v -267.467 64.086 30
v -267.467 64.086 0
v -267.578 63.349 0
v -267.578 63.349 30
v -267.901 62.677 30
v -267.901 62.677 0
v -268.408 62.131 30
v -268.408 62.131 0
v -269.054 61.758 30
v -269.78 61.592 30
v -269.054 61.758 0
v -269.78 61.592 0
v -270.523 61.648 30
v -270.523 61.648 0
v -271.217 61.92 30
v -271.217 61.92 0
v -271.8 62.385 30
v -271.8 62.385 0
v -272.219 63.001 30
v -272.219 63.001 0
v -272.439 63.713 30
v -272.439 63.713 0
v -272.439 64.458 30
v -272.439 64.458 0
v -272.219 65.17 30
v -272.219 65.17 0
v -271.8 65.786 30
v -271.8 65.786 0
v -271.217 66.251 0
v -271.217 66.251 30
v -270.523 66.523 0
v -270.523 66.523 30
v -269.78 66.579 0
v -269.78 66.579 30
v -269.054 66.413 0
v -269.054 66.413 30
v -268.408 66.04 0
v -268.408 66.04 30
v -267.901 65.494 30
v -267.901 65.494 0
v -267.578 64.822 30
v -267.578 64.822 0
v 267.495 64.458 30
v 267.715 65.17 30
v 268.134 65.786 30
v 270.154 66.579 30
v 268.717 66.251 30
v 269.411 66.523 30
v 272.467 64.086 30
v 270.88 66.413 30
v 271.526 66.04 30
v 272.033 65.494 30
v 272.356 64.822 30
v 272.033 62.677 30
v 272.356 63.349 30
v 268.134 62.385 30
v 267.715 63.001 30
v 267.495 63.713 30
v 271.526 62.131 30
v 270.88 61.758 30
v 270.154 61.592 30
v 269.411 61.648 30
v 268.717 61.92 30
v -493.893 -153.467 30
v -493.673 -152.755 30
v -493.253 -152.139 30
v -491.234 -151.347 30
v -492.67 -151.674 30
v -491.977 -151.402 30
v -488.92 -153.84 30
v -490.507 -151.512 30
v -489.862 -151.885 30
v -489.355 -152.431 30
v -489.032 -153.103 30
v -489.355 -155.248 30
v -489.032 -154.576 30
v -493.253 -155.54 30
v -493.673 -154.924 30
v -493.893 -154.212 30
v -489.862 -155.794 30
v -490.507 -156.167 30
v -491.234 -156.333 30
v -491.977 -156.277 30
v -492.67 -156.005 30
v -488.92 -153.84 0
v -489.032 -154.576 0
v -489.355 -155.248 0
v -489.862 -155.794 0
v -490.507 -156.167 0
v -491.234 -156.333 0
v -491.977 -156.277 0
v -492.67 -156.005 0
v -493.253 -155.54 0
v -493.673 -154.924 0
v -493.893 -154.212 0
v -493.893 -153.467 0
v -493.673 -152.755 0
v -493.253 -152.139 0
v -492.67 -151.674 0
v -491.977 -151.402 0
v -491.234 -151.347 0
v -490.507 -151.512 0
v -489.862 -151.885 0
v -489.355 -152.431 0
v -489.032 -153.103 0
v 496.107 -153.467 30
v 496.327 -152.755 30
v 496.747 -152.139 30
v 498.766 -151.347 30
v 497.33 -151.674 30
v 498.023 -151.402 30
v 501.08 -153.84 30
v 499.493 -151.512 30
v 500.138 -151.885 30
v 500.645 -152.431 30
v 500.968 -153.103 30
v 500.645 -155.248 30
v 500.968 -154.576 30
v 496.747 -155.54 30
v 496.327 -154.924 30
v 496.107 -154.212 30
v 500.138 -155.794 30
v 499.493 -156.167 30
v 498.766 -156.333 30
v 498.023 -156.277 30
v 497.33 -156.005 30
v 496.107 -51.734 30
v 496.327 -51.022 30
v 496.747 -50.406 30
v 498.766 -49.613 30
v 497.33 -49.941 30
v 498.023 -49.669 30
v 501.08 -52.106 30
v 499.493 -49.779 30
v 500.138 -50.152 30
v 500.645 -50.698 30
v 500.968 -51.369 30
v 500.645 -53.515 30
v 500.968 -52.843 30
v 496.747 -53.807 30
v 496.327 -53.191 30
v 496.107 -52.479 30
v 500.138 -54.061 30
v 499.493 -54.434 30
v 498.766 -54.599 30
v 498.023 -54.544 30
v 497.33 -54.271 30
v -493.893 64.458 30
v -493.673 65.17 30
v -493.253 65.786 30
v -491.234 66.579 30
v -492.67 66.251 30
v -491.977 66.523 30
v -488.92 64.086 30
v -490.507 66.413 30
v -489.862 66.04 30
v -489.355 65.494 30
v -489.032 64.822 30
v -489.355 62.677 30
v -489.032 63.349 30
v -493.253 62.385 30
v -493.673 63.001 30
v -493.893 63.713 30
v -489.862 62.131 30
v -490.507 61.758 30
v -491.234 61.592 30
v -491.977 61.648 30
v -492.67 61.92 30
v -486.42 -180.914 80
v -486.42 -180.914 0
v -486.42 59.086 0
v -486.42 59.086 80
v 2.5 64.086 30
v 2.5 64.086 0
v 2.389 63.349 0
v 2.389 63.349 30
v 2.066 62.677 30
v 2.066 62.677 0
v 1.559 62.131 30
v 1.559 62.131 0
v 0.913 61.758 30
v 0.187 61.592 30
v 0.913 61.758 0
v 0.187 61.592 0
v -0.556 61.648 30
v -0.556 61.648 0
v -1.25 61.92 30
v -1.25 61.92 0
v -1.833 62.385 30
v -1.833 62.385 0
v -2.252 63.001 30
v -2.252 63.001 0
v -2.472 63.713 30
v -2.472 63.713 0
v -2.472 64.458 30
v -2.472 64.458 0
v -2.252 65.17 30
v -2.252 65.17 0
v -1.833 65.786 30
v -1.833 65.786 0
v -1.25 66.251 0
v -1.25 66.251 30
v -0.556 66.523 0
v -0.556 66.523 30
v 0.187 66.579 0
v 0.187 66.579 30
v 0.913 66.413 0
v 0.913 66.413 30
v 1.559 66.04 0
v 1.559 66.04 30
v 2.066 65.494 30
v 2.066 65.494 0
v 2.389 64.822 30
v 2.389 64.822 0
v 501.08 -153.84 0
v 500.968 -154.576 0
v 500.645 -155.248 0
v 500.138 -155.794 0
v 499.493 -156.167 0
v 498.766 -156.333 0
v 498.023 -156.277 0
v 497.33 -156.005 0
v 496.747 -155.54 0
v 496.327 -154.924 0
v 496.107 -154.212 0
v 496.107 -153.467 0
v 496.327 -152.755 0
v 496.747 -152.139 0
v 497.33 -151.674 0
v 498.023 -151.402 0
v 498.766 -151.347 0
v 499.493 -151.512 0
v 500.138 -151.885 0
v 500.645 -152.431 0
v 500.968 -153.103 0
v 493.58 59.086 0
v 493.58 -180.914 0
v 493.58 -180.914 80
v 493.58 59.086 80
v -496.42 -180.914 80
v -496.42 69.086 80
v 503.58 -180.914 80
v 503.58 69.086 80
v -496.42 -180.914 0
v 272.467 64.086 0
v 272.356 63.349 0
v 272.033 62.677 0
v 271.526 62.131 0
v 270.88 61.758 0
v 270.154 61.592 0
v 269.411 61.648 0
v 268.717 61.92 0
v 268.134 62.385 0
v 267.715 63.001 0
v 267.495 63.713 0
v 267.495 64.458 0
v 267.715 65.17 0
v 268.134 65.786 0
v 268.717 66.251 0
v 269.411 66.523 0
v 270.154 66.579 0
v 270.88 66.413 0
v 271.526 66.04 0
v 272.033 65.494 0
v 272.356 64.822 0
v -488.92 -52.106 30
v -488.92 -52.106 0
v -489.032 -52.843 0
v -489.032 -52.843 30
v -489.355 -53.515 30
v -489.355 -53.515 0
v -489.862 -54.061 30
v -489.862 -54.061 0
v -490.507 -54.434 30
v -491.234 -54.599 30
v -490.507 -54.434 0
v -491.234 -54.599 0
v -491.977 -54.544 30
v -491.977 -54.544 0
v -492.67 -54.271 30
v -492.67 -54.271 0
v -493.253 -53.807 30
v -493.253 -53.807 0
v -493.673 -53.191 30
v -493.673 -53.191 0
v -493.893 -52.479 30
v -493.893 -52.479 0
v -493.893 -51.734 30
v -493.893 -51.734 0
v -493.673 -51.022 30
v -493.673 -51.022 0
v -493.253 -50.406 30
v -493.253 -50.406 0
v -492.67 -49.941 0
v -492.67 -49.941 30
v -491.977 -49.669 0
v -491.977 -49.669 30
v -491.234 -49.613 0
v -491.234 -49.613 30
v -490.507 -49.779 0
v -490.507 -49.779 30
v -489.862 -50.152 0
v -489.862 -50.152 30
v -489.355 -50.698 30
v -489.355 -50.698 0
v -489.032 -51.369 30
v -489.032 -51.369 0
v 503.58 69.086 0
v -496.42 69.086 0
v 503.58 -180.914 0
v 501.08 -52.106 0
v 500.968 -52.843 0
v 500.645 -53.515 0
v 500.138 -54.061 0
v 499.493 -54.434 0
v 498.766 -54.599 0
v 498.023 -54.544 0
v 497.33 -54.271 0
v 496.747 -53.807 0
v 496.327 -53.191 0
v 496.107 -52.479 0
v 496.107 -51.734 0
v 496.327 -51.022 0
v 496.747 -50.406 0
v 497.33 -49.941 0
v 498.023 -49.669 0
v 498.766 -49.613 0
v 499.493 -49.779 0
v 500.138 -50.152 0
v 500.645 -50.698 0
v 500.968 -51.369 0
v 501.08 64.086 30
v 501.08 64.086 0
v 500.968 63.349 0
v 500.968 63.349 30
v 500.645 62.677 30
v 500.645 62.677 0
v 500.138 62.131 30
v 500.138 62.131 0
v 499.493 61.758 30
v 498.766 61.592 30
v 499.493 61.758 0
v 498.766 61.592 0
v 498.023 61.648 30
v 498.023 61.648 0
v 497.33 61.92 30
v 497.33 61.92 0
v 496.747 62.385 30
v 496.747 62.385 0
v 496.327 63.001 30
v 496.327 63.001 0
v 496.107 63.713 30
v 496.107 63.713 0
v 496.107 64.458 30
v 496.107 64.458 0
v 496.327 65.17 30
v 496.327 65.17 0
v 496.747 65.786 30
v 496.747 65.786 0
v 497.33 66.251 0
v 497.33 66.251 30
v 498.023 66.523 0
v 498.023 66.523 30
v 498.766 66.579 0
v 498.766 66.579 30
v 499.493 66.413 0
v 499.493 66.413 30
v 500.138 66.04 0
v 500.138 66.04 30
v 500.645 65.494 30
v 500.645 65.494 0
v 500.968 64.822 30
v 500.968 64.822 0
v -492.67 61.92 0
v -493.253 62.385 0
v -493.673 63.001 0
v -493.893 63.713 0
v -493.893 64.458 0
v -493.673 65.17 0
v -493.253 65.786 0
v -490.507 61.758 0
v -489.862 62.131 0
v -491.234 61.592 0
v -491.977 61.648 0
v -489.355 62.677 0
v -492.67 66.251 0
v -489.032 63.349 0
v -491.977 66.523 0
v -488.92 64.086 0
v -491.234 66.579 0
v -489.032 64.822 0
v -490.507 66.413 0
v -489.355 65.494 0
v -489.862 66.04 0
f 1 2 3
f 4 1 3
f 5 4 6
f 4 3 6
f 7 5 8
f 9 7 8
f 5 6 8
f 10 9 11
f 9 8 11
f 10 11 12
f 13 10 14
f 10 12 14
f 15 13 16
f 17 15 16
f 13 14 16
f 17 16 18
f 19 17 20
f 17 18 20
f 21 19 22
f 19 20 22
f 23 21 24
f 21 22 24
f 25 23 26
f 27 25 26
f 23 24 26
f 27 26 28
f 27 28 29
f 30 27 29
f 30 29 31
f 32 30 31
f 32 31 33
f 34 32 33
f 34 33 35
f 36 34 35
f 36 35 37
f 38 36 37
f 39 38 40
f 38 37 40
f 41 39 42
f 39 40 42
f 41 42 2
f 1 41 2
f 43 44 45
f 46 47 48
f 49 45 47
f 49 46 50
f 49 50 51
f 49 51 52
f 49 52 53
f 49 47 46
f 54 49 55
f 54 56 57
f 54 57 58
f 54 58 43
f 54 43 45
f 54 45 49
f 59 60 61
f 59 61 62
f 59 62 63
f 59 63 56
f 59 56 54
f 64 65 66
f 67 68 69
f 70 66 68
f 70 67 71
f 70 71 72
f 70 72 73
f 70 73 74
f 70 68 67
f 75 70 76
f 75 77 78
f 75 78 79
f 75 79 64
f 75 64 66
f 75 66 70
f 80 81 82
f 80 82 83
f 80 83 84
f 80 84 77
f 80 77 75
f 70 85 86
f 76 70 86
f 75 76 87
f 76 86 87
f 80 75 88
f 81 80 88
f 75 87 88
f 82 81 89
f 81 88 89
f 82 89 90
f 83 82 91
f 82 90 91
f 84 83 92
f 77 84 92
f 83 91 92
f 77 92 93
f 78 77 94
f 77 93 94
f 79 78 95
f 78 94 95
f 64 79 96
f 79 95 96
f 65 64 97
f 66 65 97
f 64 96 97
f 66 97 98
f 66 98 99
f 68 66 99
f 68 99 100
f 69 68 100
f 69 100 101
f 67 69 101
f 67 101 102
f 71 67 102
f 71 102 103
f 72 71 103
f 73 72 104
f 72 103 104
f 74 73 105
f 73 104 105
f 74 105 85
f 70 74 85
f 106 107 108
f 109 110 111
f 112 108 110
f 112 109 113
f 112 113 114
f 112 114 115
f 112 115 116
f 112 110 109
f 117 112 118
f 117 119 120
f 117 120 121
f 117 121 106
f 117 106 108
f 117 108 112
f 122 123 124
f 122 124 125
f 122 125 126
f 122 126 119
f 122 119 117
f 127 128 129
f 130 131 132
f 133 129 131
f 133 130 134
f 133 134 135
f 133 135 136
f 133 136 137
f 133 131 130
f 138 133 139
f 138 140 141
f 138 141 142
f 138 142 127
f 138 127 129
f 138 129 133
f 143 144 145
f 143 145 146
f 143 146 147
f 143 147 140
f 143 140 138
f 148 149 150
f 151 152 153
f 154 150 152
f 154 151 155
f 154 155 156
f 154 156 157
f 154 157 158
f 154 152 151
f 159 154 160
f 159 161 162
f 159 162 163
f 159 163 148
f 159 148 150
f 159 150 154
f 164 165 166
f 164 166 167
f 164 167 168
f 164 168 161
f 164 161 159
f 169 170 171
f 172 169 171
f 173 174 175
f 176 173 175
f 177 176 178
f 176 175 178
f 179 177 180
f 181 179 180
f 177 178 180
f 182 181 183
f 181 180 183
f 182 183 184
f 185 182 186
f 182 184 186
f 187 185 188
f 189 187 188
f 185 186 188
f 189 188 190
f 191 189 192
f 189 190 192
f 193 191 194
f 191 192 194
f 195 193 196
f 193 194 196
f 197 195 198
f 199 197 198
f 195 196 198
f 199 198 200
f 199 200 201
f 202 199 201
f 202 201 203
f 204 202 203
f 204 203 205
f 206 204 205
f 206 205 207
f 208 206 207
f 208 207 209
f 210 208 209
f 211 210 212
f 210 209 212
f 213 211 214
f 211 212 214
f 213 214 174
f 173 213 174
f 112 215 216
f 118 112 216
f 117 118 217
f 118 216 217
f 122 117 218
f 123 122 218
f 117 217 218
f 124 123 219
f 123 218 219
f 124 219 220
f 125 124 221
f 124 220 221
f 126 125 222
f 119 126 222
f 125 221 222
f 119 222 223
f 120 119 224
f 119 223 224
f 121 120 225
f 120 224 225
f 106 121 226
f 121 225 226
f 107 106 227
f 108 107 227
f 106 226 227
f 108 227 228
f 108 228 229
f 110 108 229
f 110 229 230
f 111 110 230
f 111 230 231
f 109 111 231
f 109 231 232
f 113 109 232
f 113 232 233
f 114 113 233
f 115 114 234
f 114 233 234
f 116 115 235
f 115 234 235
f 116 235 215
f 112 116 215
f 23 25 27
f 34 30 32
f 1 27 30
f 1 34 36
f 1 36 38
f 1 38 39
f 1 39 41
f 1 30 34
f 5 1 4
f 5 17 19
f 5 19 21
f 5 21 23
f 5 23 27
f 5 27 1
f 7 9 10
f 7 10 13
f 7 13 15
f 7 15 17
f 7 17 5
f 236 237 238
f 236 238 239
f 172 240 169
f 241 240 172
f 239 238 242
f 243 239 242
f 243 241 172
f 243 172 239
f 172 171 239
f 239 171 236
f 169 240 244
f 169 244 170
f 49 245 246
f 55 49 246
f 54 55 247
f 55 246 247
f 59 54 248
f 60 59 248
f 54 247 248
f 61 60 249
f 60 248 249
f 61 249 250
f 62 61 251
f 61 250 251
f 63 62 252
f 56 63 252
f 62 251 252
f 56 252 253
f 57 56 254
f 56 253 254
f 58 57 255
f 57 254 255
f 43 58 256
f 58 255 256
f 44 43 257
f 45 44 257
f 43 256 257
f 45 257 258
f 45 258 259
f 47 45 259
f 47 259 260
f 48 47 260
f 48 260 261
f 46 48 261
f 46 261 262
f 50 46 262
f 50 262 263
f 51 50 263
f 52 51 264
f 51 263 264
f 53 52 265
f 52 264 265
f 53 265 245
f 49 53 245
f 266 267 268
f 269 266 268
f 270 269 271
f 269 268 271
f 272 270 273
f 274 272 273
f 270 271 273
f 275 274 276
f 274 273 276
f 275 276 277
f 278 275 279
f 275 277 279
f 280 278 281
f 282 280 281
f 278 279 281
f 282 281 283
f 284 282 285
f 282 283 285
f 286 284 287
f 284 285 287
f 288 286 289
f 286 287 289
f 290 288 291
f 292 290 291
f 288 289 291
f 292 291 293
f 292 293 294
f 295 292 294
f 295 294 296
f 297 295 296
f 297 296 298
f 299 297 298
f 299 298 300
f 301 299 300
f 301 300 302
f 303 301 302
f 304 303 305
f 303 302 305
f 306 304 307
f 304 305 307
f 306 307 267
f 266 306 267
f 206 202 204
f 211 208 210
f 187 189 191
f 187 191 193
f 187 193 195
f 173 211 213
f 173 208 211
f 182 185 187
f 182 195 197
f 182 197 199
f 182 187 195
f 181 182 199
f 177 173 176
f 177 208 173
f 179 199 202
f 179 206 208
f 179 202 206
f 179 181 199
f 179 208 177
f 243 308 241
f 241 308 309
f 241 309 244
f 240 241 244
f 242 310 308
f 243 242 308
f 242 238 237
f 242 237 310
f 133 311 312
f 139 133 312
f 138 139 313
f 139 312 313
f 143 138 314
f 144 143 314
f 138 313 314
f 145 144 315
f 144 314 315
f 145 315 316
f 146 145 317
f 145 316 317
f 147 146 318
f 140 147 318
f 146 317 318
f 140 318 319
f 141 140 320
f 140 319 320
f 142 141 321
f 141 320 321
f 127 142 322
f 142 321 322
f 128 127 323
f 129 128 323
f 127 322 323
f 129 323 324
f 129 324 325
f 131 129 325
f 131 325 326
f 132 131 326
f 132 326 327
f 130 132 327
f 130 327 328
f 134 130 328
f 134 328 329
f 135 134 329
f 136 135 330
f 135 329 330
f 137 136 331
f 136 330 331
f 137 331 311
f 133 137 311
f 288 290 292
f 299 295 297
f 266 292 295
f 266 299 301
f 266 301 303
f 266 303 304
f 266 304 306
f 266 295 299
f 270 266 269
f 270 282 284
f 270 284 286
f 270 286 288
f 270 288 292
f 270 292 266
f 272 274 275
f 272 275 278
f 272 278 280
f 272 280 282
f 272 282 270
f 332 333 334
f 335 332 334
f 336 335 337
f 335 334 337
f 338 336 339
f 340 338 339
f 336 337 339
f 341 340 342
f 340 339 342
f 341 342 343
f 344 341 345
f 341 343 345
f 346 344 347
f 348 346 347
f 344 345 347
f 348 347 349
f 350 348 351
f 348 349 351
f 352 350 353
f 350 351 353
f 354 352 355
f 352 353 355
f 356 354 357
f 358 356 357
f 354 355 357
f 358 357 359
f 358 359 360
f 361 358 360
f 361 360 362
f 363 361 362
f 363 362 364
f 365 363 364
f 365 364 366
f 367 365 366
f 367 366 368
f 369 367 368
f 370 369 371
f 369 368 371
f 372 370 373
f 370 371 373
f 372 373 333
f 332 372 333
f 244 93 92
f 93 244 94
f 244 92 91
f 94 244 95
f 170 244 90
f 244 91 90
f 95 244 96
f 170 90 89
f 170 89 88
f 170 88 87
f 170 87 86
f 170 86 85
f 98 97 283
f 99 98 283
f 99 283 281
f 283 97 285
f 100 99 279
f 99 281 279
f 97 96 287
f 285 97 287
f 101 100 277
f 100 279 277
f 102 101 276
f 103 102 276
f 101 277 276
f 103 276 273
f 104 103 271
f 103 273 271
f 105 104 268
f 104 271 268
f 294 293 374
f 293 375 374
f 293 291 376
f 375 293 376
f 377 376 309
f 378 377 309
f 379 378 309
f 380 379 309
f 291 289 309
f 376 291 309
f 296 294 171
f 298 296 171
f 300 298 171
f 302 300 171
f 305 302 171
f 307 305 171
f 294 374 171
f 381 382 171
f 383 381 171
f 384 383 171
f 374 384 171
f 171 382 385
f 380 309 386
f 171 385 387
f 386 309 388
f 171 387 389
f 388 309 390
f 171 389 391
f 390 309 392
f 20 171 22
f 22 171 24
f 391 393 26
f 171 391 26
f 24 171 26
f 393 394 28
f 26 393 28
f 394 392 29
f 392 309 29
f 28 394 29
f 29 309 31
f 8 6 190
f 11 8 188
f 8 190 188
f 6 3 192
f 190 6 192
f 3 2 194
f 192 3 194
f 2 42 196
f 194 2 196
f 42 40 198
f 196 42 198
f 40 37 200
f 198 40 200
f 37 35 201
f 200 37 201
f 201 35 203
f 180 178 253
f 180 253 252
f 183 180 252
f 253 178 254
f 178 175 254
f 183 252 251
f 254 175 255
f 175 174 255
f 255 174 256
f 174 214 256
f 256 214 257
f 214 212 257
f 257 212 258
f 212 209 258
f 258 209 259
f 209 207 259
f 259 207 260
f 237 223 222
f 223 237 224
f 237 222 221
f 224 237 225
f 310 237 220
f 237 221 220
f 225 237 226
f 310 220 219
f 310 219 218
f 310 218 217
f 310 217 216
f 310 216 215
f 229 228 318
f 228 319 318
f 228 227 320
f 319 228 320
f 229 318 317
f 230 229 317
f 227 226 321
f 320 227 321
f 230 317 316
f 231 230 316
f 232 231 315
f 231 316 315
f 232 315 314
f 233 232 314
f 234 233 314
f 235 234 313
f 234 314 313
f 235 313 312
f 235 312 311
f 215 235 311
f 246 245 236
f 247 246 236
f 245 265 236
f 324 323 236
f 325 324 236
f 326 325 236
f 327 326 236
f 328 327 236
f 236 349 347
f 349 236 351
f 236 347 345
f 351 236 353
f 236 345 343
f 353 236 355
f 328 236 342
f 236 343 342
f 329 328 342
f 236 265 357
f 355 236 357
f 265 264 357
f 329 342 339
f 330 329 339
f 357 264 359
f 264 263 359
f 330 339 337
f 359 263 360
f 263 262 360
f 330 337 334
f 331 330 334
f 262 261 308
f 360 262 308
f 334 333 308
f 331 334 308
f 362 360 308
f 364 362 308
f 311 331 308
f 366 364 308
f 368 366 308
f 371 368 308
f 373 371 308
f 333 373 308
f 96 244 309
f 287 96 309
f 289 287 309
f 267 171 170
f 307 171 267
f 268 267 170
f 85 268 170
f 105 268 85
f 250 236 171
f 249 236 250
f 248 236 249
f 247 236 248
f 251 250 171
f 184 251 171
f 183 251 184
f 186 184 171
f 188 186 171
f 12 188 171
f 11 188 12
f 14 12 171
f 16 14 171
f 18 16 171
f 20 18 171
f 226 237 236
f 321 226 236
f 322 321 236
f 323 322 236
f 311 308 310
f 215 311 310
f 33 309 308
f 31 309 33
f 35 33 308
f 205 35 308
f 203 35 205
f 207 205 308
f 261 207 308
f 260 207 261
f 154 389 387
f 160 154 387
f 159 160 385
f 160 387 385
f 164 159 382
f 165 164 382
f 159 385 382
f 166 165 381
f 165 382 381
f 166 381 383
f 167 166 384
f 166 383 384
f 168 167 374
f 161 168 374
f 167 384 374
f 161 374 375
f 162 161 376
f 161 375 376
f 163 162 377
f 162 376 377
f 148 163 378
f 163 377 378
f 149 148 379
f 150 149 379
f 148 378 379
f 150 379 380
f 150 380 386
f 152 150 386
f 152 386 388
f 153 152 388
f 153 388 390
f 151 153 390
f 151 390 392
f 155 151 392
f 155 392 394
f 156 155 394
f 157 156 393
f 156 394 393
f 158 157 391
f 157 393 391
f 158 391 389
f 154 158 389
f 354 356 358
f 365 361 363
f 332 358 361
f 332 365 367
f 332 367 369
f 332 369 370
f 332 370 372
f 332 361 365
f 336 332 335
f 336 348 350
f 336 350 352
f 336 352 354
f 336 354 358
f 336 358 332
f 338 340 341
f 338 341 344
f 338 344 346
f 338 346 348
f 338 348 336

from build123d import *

# Parameters (mm, degrees)
F0_W     = 10
F0_H     = 10
F0_W_2   = 980
F0_H_2   = 240
F1_DEPTH = 80
F2_R     = 2.5
F3_DEPTH = 30


with BuildPart() as f1:
    # F0 (on Top) → F1 (new body)
    with BuildSketch(Plane.XY):
        with Locations((-491.420456, 64.085509)):
            Rectangle(F0_W, F0_H)
        with Locations((3.579544, 64.085509)):
            Rectangle(F0_W_2, F0_H)
        with Locations((-491.420456, -60.914491)):
            Rectangle(F0_W, F0_H_2)
        with Locations((498.579544, 64.085509)):
            Rectangle(F0_W, F0_H)
        with Locations((498.579544, -60.914491)):
            Rectangle(F0_W, F0_H_2)
    extrude(amount=F1_DEPTH)

    # F2 (on face) → F3 (cut)
    with BuildSketch(Plane(origin=(0, 0, 0), x_dir=(1, 0, 0), z_dir=(0, 0, -1))):
        with Locations((-491.420456, 153.839529)):
            Circle(F2_R)
        with Locations((-491.420456, 52.106358)):
            Circle(F2_R)
        with Locations((-491.420456, -64.085509)):
            Circle(F2_R)
        with Locations((-269.96702, -64.085509)):
            Circle(F2_R)
        with Locations((0, -64.085509)):
            Circle(F2_R)
        with Locations((269.96702, -64.085509)):
            Circle(F2_R)
        with Locations((498.579544, -64.085509)):
            Circle(F2_R)
        with Locations((498.579544, 52.106358)):
            Circle(F2_R)
        with Locations((498.579544, 153.839529)):
            Circle(F2_R)
    extrude(amount=-F3_DEPTH, mode=Mode.SUBTRACT)


solid = f1.part
